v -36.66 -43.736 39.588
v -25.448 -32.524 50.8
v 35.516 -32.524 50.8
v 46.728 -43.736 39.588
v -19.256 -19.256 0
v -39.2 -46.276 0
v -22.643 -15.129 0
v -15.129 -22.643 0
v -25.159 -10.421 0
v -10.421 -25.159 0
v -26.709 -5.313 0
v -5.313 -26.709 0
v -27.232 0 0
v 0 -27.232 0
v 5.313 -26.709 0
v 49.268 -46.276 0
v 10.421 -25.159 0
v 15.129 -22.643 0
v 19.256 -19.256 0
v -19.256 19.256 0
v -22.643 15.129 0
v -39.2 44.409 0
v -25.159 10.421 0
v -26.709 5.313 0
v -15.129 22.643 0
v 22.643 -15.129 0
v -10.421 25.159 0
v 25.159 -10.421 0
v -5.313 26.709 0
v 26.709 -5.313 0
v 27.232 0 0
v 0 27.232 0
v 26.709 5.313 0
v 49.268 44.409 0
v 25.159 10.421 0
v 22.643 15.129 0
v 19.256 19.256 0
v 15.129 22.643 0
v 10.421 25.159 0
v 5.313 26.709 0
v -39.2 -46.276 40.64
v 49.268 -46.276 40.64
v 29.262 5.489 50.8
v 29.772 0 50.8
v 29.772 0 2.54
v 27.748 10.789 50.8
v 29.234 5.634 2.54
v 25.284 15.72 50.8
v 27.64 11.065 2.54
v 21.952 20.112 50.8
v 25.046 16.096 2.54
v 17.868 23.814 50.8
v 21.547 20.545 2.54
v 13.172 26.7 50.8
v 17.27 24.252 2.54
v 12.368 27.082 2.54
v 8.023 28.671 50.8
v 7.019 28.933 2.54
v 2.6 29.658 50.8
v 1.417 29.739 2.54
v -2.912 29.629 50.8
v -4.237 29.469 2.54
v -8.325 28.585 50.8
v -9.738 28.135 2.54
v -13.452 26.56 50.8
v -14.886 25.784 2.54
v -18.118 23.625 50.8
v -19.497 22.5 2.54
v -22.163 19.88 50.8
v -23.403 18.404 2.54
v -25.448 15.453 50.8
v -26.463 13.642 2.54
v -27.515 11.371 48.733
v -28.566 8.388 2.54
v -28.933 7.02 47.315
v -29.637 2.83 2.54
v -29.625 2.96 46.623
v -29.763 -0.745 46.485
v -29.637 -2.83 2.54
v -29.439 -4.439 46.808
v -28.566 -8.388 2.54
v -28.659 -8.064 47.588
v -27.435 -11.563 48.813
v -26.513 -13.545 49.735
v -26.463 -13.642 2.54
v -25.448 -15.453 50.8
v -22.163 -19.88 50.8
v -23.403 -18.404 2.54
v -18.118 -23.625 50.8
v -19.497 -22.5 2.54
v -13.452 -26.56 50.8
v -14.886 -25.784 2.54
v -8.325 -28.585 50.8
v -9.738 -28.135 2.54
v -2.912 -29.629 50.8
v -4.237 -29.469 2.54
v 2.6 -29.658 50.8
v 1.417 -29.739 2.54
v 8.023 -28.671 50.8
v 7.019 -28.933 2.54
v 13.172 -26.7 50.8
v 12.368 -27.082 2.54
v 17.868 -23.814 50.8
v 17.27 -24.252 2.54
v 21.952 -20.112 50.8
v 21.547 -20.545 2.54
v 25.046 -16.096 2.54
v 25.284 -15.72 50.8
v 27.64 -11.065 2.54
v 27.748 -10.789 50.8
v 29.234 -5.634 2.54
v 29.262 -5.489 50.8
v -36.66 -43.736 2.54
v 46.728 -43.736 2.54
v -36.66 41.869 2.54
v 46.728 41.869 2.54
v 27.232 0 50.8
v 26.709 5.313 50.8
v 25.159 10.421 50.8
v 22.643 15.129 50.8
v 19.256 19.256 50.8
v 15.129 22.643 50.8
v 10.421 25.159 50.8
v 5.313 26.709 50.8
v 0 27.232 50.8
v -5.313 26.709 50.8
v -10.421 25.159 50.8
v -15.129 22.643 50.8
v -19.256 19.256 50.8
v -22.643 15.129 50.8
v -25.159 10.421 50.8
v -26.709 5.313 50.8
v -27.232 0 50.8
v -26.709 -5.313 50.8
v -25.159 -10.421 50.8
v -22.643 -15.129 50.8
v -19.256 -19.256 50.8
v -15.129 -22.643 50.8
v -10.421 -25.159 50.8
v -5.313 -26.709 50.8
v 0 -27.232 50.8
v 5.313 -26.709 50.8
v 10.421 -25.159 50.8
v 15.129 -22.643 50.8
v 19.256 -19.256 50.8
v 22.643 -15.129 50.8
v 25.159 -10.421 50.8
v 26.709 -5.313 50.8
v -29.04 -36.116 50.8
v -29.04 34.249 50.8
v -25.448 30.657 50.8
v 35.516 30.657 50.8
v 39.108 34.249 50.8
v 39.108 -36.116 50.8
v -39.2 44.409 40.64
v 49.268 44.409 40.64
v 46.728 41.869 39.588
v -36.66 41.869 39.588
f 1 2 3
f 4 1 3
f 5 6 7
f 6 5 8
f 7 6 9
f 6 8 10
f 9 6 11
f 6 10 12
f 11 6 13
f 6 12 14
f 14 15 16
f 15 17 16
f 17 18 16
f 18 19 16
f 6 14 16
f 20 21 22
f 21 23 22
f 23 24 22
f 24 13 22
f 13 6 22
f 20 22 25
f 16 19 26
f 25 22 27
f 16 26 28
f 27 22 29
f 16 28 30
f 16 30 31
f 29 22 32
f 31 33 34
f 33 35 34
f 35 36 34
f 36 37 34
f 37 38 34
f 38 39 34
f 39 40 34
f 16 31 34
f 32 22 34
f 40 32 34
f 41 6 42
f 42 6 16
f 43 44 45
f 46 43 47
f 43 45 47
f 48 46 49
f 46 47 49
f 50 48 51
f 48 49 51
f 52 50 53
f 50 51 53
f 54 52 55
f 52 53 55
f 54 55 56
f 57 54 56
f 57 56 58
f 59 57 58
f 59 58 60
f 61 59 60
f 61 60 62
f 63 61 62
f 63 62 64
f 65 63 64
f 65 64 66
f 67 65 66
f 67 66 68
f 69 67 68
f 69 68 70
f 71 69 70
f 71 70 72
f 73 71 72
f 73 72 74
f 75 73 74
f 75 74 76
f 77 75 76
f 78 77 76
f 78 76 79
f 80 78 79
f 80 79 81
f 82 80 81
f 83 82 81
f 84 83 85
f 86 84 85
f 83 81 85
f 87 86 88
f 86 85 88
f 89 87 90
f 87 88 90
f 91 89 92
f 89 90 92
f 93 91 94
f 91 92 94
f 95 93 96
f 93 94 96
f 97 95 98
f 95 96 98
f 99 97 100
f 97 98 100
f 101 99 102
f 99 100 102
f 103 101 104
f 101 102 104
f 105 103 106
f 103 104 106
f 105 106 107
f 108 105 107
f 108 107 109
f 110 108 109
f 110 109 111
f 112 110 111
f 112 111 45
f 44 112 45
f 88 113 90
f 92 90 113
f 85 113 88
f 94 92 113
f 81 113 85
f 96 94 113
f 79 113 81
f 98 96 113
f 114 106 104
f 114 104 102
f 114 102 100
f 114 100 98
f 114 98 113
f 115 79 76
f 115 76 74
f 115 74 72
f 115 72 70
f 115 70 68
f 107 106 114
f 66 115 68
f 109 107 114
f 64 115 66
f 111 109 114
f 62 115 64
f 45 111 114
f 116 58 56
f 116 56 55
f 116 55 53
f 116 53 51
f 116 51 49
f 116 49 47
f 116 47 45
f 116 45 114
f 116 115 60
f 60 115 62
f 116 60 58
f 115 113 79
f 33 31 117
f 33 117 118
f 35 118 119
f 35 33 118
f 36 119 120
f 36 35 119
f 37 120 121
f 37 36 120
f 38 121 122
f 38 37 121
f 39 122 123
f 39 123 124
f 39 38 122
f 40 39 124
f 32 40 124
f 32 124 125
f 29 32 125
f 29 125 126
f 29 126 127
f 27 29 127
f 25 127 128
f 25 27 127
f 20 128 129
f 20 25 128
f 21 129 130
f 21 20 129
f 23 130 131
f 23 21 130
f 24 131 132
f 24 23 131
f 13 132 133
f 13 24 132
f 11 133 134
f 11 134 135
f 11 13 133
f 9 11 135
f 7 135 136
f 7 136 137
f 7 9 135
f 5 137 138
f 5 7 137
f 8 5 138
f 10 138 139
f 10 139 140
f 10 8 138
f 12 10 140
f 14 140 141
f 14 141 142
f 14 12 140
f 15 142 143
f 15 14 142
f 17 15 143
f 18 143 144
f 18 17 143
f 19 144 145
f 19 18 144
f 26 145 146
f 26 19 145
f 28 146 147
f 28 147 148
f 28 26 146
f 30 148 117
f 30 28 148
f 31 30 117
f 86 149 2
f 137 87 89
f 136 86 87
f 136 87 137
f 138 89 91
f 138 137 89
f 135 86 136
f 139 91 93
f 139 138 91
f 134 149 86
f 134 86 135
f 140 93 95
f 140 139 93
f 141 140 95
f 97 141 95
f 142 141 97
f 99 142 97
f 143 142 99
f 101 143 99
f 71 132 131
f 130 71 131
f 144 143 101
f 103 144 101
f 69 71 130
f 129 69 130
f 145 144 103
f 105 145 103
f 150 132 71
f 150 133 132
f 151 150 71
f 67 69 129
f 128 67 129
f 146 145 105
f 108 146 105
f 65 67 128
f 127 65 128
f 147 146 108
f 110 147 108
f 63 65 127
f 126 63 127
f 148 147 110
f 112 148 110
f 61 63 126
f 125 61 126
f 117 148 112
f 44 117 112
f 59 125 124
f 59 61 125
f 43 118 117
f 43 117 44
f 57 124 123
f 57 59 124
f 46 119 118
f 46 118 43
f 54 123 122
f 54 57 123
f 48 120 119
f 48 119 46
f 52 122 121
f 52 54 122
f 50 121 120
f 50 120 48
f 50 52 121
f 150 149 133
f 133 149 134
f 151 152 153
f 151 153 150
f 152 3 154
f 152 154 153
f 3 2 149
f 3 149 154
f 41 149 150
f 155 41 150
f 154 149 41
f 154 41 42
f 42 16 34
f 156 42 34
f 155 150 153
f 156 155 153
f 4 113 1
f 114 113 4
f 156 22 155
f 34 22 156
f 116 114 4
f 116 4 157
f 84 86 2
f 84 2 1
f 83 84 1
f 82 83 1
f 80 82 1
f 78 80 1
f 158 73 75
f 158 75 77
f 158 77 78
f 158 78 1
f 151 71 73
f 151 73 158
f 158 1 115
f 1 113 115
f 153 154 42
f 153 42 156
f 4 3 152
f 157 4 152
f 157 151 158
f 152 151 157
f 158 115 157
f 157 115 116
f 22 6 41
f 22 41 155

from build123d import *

# Parameters (mm, degrees)
F0_W     = 88.4682275355
F0_H     = 90.6854122877
F0_R     = 27.23223306
F1_DEPTH = 50.8
F2_SIZE  = 10.16
F3_T     = -2.54


with BuildPart() as f1:
    # F0 (on Top) → F1 (new body)
    with BuildSketch(Plane.XY):
        with Locations((5.0342325121, -0.9333491325)):
            Rectangle(F0_W, F0_H)
        Circle(F0_R, mode=Mode.SUBTRACT)
    extrude(amount=F1_DEPTH)

    # F2
    f2_edges = [f1.edges().sort_by_distance(p)[0] for p in [
        (5.034233, -46.276055, 50.8),
        (-39.199881, -0.933349, 50.8),
        (5.034233, 44.409357, 50.8),
        (49.268346, -0.933349, 50.8),
    ]]
    chamfer(f2_edges, length=F2_SIZE)

    # F3
    f3_openings = [f1.faces().sort_by_distance(p)[0] for p in [
        (5.034233, -35.13649, 50.8),
    ]]
    offset(amount=F3_T, openings=f3_openings)


solid = f1.part
